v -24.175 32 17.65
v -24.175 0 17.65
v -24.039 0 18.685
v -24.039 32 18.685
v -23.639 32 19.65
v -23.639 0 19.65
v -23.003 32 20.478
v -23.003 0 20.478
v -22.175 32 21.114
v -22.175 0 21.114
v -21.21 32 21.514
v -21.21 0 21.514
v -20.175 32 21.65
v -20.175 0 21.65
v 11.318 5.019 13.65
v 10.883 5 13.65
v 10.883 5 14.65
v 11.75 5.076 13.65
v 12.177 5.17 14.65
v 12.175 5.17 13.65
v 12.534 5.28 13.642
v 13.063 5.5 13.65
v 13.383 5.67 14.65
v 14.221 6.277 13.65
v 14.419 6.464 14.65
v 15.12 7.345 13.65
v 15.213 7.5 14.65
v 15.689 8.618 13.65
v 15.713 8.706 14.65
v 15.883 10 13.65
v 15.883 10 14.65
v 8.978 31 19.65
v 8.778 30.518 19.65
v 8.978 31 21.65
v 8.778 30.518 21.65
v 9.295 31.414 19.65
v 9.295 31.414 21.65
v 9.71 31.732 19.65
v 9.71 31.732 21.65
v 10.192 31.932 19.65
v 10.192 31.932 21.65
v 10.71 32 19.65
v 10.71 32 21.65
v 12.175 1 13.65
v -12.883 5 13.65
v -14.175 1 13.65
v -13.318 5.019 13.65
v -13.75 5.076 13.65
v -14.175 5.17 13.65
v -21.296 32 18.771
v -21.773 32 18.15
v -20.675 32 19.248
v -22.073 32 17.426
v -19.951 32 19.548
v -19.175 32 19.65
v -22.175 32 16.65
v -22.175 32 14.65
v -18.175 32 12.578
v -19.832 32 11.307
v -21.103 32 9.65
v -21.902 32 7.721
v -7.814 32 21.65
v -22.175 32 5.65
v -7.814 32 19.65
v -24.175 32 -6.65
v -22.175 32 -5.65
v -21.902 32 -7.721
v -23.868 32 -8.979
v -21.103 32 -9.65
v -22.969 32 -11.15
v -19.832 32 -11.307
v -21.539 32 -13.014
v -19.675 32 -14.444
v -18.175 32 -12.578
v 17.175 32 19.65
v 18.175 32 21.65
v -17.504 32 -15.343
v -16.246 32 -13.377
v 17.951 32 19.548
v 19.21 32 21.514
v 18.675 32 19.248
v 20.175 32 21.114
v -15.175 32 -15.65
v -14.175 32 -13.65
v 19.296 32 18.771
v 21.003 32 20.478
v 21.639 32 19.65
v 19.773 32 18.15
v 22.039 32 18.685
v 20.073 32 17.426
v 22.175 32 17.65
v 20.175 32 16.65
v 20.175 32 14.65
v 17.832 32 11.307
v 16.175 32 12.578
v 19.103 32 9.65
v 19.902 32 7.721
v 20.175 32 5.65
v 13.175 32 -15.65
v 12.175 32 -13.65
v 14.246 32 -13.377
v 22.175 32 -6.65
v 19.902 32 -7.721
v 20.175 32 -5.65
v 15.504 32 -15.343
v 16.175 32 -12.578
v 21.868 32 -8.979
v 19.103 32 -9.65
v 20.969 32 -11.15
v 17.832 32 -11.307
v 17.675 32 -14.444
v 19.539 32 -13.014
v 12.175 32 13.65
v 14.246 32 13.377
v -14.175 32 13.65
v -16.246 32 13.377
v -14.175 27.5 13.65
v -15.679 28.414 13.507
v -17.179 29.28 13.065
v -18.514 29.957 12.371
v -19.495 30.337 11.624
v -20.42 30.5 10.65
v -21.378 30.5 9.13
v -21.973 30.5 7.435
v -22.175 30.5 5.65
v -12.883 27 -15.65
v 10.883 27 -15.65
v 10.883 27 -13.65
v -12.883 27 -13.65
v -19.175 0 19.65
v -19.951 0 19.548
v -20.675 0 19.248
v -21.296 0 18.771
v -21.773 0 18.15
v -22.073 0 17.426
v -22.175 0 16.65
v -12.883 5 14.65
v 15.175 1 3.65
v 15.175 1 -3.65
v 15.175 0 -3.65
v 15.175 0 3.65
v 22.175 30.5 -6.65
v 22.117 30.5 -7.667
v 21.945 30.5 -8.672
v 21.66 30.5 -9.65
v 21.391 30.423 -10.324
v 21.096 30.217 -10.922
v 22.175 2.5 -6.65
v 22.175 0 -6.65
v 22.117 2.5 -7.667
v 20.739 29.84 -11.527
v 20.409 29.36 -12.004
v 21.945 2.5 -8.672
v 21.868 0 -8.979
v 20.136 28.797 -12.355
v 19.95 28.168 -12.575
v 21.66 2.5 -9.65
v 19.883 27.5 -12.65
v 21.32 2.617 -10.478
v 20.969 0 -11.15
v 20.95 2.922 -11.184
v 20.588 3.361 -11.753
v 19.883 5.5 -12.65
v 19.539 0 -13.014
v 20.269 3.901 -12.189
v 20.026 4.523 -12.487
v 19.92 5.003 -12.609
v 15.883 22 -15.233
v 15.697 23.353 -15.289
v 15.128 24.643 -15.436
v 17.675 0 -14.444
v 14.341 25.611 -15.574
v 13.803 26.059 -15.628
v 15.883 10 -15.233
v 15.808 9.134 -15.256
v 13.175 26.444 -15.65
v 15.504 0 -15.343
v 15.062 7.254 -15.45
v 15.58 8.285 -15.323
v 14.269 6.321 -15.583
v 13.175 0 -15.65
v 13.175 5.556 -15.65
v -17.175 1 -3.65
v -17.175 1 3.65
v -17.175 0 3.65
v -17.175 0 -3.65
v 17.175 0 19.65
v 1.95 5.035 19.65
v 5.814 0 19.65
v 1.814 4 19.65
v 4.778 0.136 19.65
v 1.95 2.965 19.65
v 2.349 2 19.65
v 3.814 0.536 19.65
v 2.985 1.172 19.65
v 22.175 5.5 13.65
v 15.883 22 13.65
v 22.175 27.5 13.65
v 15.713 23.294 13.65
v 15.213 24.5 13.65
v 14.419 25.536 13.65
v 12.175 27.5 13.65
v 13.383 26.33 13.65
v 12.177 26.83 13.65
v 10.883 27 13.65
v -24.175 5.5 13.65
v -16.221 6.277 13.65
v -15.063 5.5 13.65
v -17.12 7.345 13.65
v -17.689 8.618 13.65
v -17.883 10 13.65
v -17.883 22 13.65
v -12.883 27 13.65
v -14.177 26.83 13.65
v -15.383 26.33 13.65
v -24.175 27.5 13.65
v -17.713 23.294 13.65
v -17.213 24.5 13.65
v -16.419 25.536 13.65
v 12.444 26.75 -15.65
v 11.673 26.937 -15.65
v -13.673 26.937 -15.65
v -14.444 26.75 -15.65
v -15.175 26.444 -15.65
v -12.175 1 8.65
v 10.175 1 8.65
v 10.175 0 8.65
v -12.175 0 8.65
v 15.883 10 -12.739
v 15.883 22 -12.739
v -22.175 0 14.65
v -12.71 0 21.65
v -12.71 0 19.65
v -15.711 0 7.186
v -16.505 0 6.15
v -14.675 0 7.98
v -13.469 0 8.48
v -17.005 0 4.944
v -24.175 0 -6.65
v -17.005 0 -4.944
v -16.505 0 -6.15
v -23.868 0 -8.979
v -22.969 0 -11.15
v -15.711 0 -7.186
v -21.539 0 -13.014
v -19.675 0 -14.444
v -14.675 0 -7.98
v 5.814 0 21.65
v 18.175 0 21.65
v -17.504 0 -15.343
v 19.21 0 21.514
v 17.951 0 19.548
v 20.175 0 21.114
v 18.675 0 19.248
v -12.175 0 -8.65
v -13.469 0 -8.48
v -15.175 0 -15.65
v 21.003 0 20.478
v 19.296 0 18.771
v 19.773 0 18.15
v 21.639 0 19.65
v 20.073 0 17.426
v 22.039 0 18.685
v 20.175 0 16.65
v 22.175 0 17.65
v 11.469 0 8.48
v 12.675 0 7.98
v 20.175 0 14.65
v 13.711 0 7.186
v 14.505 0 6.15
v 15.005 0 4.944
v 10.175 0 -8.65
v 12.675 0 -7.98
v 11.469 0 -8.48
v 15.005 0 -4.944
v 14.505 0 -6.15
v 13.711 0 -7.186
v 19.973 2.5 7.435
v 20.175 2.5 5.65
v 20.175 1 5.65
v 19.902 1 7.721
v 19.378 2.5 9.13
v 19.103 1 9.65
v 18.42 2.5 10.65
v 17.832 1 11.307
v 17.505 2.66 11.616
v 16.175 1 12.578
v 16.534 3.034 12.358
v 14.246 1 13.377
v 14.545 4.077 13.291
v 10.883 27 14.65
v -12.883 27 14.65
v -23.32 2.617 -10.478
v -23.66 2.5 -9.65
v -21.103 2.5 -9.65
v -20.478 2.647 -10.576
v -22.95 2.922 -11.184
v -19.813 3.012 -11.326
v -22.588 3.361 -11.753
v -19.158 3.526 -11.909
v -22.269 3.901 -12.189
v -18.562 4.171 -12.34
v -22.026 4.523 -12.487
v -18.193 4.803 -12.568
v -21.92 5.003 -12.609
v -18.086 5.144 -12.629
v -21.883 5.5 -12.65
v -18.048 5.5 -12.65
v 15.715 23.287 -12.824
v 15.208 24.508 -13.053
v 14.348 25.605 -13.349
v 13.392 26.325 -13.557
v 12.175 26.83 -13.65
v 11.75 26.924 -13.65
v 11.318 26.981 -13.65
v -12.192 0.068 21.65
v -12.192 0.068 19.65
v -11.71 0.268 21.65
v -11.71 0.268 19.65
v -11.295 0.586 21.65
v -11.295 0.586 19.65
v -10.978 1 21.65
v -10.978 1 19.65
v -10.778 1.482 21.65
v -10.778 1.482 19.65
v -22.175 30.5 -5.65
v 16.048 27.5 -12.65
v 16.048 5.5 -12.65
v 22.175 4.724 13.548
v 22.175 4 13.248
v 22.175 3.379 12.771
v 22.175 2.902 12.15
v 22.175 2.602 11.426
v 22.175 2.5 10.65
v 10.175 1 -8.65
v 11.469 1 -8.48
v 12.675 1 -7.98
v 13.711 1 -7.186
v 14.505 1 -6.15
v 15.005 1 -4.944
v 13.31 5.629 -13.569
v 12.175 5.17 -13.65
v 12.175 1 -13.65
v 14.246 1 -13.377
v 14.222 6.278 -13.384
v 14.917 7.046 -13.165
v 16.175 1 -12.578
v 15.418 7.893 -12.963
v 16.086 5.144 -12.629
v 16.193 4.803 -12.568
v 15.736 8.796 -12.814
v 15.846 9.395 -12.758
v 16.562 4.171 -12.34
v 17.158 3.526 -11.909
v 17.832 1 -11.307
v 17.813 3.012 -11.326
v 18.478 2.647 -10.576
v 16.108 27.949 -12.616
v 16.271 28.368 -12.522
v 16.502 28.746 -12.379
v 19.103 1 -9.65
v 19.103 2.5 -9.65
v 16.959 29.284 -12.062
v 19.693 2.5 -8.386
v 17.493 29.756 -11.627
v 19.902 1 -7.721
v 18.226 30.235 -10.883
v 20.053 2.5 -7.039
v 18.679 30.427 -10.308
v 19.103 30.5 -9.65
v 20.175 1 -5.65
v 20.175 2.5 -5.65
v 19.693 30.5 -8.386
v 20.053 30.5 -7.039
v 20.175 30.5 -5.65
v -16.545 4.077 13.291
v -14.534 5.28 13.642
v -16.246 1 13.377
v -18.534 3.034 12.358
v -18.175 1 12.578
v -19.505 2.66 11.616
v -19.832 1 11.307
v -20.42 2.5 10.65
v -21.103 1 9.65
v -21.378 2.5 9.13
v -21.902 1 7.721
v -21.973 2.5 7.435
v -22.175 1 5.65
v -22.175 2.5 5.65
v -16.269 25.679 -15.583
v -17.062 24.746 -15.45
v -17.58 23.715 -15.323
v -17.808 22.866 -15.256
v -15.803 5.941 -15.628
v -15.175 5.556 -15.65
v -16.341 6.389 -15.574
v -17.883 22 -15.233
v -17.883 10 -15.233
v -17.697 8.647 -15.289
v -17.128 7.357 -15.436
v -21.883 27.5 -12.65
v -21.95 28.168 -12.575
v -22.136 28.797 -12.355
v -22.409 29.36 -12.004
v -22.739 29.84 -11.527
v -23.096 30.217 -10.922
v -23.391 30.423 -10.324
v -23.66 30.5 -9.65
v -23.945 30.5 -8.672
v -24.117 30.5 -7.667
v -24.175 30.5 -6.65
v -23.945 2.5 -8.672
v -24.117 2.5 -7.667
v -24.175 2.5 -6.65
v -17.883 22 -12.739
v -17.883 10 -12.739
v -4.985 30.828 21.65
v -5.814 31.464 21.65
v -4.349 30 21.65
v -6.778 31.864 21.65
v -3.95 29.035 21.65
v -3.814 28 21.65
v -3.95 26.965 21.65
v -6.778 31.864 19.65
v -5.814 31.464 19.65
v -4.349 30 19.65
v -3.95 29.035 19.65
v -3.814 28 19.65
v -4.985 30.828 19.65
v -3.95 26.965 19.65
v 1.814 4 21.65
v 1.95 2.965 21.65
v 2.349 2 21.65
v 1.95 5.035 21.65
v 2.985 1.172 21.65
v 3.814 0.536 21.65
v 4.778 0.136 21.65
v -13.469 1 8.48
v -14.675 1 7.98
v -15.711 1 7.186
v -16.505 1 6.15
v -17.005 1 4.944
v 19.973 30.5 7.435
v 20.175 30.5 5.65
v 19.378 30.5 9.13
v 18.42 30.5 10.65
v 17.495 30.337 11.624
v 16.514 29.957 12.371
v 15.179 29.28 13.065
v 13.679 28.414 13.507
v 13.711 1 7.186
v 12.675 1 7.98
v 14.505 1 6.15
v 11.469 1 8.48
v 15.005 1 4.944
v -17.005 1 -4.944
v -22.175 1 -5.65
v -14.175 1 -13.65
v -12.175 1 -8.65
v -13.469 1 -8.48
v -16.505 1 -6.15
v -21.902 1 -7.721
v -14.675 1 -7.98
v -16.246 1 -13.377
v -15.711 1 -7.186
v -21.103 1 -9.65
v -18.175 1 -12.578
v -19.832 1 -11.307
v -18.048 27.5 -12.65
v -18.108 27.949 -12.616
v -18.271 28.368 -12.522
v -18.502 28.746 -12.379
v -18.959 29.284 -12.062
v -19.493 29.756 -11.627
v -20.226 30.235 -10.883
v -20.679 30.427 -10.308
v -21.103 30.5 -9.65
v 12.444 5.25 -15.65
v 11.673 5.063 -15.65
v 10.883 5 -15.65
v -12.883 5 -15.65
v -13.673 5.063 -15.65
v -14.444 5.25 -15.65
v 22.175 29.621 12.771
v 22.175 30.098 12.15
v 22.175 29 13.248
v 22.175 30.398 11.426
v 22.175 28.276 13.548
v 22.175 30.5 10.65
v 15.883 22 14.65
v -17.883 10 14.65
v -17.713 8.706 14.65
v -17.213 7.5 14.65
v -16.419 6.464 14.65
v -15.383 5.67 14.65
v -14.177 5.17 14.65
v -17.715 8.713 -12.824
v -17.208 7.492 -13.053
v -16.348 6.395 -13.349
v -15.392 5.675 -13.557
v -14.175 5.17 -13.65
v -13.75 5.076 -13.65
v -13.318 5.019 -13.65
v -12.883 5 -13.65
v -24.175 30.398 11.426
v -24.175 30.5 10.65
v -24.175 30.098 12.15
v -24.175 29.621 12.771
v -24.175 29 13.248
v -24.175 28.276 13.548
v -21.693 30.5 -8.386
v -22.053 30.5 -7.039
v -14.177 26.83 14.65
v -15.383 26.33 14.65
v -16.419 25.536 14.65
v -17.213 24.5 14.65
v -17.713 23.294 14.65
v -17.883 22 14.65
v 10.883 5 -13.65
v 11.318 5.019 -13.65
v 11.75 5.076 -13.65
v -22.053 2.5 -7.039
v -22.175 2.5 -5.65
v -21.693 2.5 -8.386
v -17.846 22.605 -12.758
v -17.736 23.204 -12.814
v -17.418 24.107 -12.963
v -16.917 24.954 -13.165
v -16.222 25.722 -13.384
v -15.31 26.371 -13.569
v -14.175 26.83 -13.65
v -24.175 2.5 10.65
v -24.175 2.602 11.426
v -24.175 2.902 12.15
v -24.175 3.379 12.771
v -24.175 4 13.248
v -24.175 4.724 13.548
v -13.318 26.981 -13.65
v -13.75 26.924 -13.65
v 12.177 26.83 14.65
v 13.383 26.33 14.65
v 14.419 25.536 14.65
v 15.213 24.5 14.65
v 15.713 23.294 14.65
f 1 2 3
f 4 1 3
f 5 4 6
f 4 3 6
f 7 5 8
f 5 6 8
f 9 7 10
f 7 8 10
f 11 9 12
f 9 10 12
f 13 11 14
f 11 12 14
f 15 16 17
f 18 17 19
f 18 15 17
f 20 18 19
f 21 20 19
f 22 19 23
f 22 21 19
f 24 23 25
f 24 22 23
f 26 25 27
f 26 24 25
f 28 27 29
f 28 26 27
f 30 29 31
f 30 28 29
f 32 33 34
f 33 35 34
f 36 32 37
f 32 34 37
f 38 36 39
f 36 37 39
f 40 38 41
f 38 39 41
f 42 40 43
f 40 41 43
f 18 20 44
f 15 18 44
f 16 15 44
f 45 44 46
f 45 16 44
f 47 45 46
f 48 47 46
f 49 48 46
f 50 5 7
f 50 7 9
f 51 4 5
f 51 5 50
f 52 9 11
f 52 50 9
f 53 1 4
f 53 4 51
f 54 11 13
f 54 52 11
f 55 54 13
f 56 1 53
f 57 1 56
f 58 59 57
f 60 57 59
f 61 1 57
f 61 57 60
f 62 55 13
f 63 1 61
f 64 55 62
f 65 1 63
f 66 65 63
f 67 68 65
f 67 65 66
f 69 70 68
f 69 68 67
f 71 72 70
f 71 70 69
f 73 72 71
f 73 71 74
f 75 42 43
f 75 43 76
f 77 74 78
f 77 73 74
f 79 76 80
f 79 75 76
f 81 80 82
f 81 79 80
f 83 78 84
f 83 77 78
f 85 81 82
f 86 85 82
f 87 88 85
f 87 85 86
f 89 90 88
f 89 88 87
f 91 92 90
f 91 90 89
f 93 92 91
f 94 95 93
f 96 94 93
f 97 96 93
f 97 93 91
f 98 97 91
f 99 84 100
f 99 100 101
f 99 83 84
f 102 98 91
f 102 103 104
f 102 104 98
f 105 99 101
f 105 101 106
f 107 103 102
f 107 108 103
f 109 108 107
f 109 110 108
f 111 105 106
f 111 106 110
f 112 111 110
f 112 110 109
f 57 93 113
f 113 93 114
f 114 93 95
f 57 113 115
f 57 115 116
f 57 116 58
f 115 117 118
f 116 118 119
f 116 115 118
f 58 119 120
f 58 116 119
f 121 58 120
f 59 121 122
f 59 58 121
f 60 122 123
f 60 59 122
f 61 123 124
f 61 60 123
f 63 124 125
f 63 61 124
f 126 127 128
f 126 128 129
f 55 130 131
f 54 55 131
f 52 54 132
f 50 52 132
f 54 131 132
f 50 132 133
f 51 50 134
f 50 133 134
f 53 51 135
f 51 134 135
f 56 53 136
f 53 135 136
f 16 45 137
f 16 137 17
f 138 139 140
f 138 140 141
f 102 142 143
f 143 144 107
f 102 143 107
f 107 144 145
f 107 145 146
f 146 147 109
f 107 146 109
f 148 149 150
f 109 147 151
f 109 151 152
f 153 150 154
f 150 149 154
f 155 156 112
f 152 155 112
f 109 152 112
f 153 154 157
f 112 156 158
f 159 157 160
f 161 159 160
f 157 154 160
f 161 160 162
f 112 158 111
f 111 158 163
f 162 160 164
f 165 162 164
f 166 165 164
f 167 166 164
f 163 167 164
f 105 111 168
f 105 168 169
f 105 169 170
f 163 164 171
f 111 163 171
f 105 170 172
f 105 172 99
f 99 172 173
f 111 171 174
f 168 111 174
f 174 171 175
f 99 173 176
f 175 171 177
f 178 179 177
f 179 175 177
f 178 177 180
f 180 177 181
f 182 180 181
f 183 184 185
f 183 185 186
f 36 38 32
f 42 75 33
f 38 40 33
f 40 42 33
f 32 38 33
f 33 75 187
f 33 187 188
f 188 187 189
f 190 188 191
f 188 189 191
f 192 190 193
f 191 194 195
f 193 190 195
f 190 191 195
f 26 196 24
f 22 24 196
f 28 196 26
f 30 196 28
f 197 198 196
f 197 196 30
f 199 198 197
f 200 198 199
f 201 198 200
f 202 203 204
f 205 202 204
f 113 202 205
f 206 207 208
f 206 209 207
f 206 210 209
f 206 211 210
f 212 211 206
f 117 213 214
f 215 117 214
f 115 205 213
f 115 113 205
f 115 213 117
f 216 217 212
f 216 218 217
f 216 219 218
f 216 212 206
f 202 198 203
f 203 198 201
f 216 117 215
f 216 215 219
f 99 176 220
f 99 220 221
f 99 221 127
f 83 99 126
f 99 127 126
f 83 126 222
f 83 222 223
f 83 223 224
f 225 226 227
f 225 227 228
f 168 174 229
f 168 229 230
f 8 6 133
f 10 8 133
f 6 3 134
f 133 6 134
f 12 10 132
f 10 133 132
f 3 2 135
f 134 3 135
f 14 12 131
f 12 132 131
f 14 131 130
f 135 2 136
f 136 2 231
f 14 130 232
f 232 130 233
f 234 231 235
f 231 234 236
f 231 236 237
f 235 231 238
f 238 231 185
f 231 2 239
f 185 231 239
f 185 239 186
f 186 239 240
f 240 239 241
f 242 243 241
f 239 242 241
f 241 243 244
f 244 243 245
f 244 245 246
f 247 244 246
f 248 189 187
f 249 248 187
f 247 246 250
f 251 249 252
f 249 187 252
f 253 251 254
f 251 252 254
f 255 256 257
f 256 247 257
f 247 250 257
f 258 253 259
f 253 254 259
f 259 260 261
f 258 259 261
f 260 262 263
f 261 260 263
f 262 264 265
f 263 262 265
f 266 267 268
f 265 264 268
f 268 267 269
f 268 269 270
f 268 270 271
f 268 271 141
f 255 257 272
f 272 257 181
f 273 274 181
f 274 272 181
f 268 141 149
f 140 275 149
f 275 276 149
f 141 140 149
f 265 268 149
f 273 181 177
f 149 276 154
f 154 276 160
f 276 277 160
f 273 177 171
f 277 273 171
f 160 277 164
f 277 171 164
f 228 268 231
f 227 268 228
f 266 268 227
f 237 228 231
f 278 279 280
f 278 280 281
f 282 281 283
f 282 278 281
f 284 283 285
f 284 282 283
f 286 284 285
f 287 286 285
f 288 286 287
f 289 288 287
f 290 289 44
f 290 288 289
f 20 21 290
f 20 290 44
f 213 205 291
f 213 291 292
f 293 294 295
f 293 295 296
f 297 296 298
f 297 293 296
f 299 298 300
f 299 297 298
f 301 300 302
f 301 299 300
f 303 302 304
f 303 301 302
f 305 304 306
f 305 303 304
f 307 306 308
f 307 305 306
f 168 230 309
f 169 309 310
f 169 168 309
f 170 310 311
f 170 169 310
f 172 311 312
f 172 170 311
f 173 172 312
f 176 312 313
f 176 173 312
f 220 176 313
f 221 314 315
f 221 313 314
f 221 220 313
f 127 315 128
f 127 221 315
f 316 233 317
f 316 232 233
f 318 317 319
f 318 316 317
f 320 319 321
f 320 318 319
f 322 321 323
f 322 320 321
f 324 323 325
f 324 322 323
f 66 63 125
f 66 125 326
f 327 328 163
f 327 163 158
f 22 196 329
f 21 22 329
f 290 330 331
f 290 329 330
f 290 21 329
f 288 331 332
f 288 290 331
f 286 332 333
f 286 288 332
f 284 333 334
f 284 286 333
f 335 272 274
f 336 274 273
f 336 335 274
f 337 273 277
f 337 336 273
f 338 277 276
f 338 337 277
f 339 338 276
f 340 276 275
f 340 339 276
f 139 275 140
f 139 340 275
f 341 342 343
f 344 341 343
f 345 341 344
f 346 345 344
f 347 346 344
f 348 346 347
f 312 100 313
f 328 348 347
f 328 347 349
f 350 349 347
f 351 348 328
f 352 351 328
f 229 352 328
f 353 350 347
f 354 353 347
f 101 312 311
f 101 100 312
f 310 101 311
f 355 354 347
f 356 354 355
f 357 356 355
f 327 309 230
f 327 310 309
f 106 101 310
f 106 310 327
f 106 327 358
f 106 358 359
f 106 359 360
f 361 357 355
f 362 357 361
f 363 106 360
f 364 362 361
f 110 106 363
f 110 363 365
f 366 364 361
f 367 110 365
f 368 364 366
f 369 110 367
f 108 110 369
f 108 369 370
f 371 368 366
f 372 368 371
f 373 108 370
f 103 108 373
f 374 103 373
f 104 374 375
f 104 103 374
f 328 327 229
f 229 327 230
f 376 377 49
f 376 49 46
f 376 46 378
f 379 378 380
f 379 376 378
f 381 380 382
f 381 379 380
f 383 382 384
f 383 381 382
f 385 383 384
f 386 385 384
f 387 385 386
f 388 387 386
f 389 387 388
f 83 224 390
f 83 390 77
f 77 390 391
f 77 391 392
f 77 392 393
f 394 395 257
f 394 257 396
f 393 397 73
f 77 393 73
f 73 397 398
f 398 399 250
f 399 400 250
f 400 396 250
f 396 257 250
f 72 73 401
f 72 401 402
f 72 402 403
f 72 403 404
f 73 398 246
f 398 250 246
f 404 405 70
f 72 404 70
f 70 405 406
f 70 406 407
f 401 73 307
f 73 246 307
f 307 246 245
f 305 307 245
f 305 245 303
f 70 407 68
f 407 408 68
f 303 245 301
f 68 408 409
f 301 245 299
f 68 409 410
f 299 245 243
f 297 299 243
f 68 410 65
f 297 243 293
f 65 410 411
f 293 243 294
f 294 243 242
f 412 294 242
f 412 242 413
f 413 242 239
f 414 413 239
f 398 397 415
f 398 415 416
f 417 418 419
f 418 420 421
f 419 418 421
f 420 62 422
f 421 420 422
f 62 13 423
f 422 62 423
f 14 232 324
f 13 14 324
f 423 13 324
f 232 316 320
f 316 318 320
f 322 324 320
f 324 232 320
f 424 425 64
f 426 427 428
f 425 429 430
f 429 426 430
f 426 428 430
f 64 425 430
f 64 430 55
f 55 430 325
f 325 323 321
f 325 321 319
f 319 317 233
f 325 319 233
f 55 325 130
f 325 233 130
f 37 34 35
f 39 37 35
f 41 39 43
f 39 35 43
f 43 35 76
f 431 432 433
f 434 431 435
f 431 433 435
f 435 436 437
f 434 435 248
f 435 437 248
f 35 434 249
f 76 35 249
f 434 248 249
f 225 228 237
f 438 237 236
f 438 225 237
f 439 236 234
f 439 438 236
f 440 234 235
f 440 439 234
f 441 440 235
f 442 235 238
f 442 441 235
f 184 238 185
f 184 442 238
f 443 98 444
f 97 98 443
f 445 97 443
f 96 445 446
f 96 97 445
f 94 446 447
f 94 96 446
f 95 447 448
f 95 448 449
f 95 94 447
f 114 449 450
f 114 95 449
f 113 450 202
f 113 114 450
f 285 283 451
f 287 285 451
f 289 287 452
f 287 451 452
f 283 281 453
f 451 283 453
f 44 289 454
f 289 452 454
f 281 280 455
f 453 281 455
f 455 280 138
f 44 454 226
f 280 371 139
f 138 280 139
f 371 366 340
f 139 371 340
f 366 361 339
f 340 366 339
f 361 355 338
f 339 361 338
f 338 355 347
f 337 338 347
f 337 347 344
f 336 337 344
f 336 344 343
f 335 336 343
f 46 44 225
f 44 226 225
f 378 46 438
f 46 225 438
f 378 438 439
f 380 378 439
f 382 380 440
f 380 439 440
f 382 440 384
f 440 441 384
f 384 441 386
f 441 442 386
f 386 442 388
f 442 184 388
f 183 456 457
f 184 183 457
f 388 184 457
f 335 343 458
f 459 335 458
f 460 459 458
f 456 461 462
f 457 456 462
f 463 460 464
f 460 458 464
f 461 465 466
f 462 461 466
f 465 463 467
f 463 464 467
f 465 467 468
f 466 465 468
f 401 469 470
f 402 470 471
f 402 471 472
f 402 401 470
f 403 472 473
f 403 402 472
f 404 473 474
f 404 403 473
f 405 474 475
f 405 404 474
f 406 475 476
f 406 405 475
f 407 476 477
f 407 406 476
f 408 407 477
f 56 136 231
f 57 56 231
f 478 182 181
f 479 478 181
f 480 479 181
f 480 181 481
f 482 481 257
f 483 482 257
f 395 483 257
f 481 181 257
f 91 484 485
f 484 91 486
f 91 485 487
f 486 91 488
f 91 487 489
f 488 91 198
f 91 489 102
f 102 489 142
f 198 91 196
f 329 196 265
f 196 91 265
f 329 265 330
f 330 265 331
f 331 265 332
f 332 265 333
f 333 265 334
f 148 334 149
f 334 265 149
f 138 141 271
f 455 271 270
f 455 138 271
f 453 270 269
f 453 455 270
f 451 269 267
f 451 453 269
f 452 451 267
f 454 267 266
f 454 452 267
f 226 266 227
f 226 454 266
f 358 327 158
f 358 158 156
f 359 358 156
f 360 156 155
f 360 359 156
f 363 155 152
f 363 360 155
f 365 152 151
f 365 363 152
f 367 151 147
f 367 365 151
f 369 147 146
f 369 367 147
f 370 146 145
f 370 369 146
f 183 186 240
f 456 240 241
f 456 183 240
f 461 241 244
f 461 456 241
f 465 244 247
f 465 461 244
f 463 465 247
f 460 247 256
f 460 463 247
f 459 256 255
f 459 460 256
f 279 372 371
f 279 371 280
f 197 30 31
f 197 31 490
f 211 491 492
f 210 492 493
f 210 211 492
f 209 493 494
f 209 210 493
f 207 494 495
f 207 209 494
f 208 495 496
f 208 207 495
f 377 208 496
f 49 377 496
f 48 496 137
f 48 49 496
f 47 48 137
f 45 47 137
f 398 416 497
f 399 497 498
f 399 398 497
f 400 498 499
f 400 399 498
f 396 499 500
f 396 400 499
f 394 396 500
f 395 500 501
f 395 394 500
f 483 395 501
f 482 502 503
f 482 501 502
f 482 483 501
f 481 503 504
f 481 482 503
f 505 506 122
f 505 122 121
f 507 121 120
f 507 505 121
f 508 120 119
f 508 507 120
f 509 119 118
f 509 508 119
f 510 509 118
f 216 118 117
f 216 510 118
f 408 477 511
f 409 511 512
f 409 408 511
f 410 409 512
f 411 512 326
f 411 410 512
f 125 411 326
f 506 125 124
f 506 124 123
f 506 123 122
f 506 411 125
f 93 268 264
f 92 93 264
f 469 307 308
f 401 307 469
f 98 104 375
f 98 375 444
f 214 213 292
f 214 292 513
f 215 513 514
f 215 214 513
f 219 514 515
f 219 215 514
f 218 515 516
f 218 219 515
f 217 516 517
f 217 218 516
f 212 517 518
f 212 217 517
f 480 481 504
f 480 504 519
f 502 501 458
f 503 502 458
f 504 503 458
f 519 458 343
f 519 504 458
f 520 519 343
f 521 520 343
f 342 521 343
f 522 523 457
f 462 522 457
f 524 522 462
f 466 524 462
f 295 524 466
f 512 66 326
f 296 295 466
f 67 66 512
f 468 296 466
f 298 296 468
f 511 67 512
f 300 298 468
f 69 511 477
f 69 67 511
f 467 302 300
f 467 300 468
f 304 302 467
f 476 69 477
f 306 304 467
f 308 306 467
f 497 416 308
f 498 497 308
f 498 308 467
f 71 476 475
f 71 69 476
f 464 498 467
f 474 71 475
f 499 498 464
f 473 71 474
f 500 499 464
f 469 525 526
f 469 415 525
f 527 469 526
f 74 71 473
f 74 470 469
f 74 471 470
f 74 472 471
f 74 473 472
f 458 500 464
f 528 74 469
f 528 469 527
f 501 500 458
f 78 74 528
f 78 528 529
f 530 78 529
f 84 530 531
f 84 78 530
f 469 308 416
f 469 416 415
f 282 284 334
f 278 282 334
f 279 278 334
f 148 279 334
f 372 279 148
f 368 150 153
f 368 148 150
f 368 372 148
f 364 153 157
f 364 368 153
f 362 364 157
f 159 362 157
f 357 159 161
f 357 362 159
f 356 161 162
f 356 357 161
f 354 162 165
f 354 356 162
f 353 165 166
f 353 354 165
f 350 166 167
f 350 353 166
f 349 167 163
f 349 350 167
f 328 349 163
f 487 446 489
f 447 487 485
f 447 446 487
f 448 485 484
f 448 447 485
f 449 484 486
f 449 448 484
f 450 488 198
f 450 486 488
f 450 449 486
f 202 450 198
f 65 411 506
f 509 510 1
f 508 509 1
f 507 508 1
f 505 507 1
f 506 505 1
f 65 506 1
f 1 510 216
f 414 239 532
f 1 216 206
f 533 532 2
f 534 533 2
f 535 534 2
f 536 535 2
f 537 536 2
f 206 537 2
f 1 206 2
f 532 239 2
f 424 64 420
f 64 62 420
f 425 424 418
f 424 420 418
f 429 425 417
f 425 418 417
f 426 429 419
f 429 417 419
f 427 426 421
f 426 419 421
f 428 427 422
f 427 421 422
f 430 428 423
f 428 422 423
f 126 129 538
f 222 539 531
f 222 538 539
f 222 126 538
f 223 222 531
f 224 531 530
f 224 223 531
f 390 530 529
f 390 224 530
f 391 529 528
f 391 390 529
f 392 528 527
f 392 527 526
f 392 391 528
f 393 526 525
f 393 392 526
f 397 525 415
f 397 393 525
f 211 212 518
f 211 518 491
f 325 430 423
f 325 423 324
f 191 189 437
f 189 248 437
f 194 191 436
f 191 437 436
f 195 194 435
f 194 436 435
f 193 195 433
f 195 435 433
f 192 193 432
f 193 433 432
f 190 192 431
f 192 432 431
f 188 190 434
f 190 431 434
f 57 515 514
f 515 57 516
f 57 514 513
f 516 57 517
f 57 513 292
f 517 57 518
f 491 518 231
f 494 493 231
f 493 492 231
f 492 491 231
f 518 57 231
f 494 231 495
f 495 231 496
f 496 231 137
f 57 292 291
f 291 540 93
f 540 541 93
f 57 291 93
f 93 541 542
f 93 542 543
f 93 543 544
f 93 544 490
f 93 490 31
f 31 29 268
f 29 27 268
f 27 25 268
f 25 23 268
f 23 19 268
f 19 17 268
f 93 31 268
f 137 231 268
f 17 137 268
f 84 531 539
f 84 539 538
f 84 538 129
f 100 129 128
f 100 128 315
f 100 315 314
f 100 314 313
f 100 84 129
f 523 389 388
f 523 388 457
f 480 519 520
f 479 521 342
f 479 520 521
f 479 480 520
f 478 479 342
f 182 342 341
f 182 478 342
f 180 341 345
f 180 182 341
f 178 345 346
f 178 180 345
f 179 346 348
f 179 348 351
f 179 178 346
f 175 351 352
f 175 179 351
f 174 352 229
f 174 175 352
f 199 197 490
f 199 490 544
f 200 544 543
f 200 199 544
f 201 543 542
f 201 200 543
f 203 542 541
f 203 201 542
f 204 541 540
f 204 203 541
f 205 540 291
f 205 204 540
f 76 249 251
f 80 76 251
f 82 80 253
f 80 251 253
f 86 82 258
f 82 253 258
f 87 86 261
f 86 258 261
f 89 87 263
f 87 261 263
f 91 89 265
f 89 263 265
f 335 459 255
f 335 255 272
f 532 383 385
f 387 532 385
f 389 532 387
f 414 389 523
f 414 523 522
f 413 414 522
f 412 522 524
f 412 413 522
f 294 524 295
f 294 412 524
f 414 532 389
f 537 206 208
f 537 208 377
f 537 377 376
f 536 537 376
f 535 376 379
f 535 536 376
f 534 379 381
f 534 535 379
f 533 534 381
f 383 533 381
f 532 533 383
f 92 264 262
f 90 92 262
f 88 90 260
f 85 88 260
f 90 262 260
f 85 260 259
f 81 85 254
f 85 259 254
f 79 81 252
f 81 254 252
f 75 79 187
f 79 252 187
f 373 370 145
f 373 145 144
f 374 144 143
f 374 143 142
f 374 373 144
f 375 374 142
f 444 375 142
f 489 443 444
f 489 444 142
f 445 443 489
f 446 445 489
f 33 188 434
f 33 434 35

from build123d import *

# Parameters (mm, degrees)
BOSS_EXTRUDE5_DEPTH = 32
CUT_EXTRUDE1_DEPTH  = 31
CUT_EXTRUDE2_DEPTH  = 45.879317341
CUT_EXTRUDE3_START  = -15
CUT_EXTRUDE3_DEPTH  = 2
FILLET1_R           = 4
FILLET2_R           = 2
CUT_EXTRUDE4_DEPTH  = 77.779196401
CUT_EXTRUDE5_DEPTH  = 55


with BuildPart() as part:
    # Sketch1 → Boss-Extrude5 (new body)
    with BuildSketch(Plane(origin=(0, 0, 0), x_dir=(1, 0, 0), z_dir=(0, 1, 0))):
        with BuildLine():
            Line((-0.399762594, -21.65), (18.175, -21.65))
            ThreePointArc((18.175, -21.65), (21.003427125, -20.478427125), (22.175, -17.65))
            Line((22.175, -17.65), (22.175, -8.65))
            Line((22.175, -8.65), (22.175, 6.65))
            ThreePointArc((22.175, 6.65), (19.538961031, 13.013961031), (13.175, 15.65))
            Line((13.175, 15.65), (-15.175, 15.65))
            ThreePointArc((-15.175, 15.65), (-21.538961031, 13.013961031), (-24.175, 6.65))
            Line((-24.175, 6.65), (-24.175, -8.65))
            Line((-24.175, -8.65), (-24.175, -17.65))
            ThreePointArc((-24.175, -17.65), (-23.003427125, -20.478427125), (-20.175, -21.65))
            Line((-20.175, -21.65), (-1.758134267, -21.65))
            Line((-1.758134267, -21.65), (-1.758134267, -19.65))
            Line((-1.758134267, -19.65), (-19.175, -19.65))
            ThreePointArc((-19.175, -19.65), (-21.296320344, -18.771320344), (-22.175, -16.65))
            Line((-22.175, -16.65), (-22.175, -14.65))
            Line((-22.175, -14.65), (20.175, -14.65))
            Line((20.175, -14.65), (20.175, -16.65))
            ThreePointArc((20.175, -16.65), (19.296320344, -18.771320344), (17.175, -19.65))
            Line((17.175, -19.65), (-0.399762594, -19.65))
            Line((-0.399762594, -19.65), (-0.399762594, -21.65))
        make_face()
    extrude(amount=BOSS_EXTRUDE5_DEPTH)

    # Sketch6 → Cut-Extrude1 (cut)
    with BuildSketch(Plane(origin=(0, 32, 0), x_dir=(1, 0, 0), z_dir=(0, 1, 0))):
        with BuildLine():
            Line((-14.175, 13.65), (12.175, 13.65))
            ThreePointArc((12.175, 13.65), (17.831854249, 11.306854249), (20.175, 5.65))
            Line((20.175, 5.65), (20.175, -5.65))
            ThreePointArc((20.175, -5.65), (17.831854249, -11.306854249), (12.175, -13.65))
            Line((12.175, -13.65), (-14.175, -13.65))
            ThreePointArc((-14.175, -13.65), (-19.831854249, -11.306854249), (-22.175, -5.65))
            Line((-22.175, -5.65), (-22.175, 5.65))
            ThreePointArc((-22.175, 5.65), (-19.831854249, 11.306854249), (-14.175, 13.65))
        make_face()
    extrude(amount=-CUT_EXTRUDE1_DEPTH, mode=Mode.SUBTRACT)

    # Sketch9 → Cut-Extrude2 (cut, through all)
    with BuildSketch(Plane(origin=(0, 1, 0), x_dir=(1, 0, 0), z_dir=(0, 1, 0))):
        with BuildLine():
            Line((-12.175, 8.65), (10.175, 8.65))
            ThreePointArc((10.175, 8.65), (13.710533906, 7.185533906), (15.175, 3.65))
            Line((15.175, 3.65), (15.175, -3.65))
            ThreePointArc((15.175, -3.65), (13.710533906, -7.185533906), (10.175, -8.65))
            Line((10.175, -8.65), (-12.175, -8.65))
            ThreePointArc((-12.175, -8.65), (-15.710533906, -7.185533906), (-17.175, -3.65))
            Line((-17.175, -3.65), (-17.175, 3.65))
            ThreePointArc((-17.175, 3.65), (-15.710533906, 7.185533906), (-12.175, 8.65))
        make_face()
    extrude(amount=-CUT_EXTRUDE2_DEPTH, mode=Mode.SUBTRACT)

    # Sketch11 → Cut-Extrude3 (cut)
    with BuildSketch(Plane.XY.offset(34.65).offset(CUT_EXTRUDE3_START)):
        Polygon((-2.600625842, 32), (-11.175, 0), (0.600625842, 0), (9.175, 32), align=None)
    extrude(amount=CUT_EXTRUDE3_DEPTH, mode=Mode.SUBTRACT)

    # Fillet1
    fillet1_edges = [part.edges().sort_by_distance(p)[0] for p in [
        (0.600625842, 0, 20.65),
        (-2.600625842, 32, 20.65),
    ]]
    fillet(fillet1_edges, radius=FILLET1_R)

    # Fillet2
    fillet2_edges = [part.edges().sort_by_distance(p)[0] for p in [
        (9.175, 32, 20.65),
        (-11.175, 0, 20.65),
    ]]
    fillet(fillet2_edges, radius=FILLET2_R)

    # Sketch13 → Cut-Extrude4 (cut, through all)
    with BuildSketch(Plane.ZY.offset(44.175)):
        with BuildLine():
            Line((-9.65, 30.5), (10.65, 30.5))
            ThreePointArc((10.65, 30.5), (12.771320344, 29.621320344), (13.65, 27.5))
            Line((13.65, 27.5), (13.65, 5.5))
            ThreePointArc((13.65, 5.5), (12.771320344, 3.378679656), (10.65, 2.5))
            Line((10.65, 2.5), (-9.65, 2.5))
            ThreePointArc((-9.65, 2.5), (-11.771320344, 3.378679656), (-12.65, 5.5))
            Line((-12.65, 5.5), (-12.65, 27.5))
            ThreePointArc((-12.65, 27.5), (-11.771320344, 29.621320344), (-9.65, 30.5))
        make_face()
    extrude(amount=-CUT_EXTRUDE4_DEPTH, mode=Mode.SUBTRACT)

    # Sketch14 → Cut-Extrude5 (cut)
    with BuildSketch(Plane(origin=(0, 0, -35.65), x_dir=(-1, 0, 0), z_dir=(0, 0, -1))):
        with BuildLine():
            Line((-10.883203932, 27), (12.883203932, 27))
            ThreePointArc((12.883203932, 27), (16.418737838, 25.535533906), (17.883203932, 22))
            Line((17.883203932, 22), (17.883203932, 10))
            ThreePointArc((17.883203932, 10), (16.418737838, 6.464466094), (12.883203932, 5))
            Line((12.883203932, 5), (-10.883203932, 5))
            ThreePointArc((-10.883203932, 5), (-14.418737838, 6.464466094), (-15.883203932, 10))
            Line((-15.883203932, 10), (-15.883203932, 22))
            ThreePointArc((-15.883203932, 22), (-14.418737838, 25.535533906), (-10.883203932, 27))
        make_face()
    extrude(amount=-CUT_EXTRUDE5_DEPTH, mode=Mode.SUBTRACT)


solid = part.part
